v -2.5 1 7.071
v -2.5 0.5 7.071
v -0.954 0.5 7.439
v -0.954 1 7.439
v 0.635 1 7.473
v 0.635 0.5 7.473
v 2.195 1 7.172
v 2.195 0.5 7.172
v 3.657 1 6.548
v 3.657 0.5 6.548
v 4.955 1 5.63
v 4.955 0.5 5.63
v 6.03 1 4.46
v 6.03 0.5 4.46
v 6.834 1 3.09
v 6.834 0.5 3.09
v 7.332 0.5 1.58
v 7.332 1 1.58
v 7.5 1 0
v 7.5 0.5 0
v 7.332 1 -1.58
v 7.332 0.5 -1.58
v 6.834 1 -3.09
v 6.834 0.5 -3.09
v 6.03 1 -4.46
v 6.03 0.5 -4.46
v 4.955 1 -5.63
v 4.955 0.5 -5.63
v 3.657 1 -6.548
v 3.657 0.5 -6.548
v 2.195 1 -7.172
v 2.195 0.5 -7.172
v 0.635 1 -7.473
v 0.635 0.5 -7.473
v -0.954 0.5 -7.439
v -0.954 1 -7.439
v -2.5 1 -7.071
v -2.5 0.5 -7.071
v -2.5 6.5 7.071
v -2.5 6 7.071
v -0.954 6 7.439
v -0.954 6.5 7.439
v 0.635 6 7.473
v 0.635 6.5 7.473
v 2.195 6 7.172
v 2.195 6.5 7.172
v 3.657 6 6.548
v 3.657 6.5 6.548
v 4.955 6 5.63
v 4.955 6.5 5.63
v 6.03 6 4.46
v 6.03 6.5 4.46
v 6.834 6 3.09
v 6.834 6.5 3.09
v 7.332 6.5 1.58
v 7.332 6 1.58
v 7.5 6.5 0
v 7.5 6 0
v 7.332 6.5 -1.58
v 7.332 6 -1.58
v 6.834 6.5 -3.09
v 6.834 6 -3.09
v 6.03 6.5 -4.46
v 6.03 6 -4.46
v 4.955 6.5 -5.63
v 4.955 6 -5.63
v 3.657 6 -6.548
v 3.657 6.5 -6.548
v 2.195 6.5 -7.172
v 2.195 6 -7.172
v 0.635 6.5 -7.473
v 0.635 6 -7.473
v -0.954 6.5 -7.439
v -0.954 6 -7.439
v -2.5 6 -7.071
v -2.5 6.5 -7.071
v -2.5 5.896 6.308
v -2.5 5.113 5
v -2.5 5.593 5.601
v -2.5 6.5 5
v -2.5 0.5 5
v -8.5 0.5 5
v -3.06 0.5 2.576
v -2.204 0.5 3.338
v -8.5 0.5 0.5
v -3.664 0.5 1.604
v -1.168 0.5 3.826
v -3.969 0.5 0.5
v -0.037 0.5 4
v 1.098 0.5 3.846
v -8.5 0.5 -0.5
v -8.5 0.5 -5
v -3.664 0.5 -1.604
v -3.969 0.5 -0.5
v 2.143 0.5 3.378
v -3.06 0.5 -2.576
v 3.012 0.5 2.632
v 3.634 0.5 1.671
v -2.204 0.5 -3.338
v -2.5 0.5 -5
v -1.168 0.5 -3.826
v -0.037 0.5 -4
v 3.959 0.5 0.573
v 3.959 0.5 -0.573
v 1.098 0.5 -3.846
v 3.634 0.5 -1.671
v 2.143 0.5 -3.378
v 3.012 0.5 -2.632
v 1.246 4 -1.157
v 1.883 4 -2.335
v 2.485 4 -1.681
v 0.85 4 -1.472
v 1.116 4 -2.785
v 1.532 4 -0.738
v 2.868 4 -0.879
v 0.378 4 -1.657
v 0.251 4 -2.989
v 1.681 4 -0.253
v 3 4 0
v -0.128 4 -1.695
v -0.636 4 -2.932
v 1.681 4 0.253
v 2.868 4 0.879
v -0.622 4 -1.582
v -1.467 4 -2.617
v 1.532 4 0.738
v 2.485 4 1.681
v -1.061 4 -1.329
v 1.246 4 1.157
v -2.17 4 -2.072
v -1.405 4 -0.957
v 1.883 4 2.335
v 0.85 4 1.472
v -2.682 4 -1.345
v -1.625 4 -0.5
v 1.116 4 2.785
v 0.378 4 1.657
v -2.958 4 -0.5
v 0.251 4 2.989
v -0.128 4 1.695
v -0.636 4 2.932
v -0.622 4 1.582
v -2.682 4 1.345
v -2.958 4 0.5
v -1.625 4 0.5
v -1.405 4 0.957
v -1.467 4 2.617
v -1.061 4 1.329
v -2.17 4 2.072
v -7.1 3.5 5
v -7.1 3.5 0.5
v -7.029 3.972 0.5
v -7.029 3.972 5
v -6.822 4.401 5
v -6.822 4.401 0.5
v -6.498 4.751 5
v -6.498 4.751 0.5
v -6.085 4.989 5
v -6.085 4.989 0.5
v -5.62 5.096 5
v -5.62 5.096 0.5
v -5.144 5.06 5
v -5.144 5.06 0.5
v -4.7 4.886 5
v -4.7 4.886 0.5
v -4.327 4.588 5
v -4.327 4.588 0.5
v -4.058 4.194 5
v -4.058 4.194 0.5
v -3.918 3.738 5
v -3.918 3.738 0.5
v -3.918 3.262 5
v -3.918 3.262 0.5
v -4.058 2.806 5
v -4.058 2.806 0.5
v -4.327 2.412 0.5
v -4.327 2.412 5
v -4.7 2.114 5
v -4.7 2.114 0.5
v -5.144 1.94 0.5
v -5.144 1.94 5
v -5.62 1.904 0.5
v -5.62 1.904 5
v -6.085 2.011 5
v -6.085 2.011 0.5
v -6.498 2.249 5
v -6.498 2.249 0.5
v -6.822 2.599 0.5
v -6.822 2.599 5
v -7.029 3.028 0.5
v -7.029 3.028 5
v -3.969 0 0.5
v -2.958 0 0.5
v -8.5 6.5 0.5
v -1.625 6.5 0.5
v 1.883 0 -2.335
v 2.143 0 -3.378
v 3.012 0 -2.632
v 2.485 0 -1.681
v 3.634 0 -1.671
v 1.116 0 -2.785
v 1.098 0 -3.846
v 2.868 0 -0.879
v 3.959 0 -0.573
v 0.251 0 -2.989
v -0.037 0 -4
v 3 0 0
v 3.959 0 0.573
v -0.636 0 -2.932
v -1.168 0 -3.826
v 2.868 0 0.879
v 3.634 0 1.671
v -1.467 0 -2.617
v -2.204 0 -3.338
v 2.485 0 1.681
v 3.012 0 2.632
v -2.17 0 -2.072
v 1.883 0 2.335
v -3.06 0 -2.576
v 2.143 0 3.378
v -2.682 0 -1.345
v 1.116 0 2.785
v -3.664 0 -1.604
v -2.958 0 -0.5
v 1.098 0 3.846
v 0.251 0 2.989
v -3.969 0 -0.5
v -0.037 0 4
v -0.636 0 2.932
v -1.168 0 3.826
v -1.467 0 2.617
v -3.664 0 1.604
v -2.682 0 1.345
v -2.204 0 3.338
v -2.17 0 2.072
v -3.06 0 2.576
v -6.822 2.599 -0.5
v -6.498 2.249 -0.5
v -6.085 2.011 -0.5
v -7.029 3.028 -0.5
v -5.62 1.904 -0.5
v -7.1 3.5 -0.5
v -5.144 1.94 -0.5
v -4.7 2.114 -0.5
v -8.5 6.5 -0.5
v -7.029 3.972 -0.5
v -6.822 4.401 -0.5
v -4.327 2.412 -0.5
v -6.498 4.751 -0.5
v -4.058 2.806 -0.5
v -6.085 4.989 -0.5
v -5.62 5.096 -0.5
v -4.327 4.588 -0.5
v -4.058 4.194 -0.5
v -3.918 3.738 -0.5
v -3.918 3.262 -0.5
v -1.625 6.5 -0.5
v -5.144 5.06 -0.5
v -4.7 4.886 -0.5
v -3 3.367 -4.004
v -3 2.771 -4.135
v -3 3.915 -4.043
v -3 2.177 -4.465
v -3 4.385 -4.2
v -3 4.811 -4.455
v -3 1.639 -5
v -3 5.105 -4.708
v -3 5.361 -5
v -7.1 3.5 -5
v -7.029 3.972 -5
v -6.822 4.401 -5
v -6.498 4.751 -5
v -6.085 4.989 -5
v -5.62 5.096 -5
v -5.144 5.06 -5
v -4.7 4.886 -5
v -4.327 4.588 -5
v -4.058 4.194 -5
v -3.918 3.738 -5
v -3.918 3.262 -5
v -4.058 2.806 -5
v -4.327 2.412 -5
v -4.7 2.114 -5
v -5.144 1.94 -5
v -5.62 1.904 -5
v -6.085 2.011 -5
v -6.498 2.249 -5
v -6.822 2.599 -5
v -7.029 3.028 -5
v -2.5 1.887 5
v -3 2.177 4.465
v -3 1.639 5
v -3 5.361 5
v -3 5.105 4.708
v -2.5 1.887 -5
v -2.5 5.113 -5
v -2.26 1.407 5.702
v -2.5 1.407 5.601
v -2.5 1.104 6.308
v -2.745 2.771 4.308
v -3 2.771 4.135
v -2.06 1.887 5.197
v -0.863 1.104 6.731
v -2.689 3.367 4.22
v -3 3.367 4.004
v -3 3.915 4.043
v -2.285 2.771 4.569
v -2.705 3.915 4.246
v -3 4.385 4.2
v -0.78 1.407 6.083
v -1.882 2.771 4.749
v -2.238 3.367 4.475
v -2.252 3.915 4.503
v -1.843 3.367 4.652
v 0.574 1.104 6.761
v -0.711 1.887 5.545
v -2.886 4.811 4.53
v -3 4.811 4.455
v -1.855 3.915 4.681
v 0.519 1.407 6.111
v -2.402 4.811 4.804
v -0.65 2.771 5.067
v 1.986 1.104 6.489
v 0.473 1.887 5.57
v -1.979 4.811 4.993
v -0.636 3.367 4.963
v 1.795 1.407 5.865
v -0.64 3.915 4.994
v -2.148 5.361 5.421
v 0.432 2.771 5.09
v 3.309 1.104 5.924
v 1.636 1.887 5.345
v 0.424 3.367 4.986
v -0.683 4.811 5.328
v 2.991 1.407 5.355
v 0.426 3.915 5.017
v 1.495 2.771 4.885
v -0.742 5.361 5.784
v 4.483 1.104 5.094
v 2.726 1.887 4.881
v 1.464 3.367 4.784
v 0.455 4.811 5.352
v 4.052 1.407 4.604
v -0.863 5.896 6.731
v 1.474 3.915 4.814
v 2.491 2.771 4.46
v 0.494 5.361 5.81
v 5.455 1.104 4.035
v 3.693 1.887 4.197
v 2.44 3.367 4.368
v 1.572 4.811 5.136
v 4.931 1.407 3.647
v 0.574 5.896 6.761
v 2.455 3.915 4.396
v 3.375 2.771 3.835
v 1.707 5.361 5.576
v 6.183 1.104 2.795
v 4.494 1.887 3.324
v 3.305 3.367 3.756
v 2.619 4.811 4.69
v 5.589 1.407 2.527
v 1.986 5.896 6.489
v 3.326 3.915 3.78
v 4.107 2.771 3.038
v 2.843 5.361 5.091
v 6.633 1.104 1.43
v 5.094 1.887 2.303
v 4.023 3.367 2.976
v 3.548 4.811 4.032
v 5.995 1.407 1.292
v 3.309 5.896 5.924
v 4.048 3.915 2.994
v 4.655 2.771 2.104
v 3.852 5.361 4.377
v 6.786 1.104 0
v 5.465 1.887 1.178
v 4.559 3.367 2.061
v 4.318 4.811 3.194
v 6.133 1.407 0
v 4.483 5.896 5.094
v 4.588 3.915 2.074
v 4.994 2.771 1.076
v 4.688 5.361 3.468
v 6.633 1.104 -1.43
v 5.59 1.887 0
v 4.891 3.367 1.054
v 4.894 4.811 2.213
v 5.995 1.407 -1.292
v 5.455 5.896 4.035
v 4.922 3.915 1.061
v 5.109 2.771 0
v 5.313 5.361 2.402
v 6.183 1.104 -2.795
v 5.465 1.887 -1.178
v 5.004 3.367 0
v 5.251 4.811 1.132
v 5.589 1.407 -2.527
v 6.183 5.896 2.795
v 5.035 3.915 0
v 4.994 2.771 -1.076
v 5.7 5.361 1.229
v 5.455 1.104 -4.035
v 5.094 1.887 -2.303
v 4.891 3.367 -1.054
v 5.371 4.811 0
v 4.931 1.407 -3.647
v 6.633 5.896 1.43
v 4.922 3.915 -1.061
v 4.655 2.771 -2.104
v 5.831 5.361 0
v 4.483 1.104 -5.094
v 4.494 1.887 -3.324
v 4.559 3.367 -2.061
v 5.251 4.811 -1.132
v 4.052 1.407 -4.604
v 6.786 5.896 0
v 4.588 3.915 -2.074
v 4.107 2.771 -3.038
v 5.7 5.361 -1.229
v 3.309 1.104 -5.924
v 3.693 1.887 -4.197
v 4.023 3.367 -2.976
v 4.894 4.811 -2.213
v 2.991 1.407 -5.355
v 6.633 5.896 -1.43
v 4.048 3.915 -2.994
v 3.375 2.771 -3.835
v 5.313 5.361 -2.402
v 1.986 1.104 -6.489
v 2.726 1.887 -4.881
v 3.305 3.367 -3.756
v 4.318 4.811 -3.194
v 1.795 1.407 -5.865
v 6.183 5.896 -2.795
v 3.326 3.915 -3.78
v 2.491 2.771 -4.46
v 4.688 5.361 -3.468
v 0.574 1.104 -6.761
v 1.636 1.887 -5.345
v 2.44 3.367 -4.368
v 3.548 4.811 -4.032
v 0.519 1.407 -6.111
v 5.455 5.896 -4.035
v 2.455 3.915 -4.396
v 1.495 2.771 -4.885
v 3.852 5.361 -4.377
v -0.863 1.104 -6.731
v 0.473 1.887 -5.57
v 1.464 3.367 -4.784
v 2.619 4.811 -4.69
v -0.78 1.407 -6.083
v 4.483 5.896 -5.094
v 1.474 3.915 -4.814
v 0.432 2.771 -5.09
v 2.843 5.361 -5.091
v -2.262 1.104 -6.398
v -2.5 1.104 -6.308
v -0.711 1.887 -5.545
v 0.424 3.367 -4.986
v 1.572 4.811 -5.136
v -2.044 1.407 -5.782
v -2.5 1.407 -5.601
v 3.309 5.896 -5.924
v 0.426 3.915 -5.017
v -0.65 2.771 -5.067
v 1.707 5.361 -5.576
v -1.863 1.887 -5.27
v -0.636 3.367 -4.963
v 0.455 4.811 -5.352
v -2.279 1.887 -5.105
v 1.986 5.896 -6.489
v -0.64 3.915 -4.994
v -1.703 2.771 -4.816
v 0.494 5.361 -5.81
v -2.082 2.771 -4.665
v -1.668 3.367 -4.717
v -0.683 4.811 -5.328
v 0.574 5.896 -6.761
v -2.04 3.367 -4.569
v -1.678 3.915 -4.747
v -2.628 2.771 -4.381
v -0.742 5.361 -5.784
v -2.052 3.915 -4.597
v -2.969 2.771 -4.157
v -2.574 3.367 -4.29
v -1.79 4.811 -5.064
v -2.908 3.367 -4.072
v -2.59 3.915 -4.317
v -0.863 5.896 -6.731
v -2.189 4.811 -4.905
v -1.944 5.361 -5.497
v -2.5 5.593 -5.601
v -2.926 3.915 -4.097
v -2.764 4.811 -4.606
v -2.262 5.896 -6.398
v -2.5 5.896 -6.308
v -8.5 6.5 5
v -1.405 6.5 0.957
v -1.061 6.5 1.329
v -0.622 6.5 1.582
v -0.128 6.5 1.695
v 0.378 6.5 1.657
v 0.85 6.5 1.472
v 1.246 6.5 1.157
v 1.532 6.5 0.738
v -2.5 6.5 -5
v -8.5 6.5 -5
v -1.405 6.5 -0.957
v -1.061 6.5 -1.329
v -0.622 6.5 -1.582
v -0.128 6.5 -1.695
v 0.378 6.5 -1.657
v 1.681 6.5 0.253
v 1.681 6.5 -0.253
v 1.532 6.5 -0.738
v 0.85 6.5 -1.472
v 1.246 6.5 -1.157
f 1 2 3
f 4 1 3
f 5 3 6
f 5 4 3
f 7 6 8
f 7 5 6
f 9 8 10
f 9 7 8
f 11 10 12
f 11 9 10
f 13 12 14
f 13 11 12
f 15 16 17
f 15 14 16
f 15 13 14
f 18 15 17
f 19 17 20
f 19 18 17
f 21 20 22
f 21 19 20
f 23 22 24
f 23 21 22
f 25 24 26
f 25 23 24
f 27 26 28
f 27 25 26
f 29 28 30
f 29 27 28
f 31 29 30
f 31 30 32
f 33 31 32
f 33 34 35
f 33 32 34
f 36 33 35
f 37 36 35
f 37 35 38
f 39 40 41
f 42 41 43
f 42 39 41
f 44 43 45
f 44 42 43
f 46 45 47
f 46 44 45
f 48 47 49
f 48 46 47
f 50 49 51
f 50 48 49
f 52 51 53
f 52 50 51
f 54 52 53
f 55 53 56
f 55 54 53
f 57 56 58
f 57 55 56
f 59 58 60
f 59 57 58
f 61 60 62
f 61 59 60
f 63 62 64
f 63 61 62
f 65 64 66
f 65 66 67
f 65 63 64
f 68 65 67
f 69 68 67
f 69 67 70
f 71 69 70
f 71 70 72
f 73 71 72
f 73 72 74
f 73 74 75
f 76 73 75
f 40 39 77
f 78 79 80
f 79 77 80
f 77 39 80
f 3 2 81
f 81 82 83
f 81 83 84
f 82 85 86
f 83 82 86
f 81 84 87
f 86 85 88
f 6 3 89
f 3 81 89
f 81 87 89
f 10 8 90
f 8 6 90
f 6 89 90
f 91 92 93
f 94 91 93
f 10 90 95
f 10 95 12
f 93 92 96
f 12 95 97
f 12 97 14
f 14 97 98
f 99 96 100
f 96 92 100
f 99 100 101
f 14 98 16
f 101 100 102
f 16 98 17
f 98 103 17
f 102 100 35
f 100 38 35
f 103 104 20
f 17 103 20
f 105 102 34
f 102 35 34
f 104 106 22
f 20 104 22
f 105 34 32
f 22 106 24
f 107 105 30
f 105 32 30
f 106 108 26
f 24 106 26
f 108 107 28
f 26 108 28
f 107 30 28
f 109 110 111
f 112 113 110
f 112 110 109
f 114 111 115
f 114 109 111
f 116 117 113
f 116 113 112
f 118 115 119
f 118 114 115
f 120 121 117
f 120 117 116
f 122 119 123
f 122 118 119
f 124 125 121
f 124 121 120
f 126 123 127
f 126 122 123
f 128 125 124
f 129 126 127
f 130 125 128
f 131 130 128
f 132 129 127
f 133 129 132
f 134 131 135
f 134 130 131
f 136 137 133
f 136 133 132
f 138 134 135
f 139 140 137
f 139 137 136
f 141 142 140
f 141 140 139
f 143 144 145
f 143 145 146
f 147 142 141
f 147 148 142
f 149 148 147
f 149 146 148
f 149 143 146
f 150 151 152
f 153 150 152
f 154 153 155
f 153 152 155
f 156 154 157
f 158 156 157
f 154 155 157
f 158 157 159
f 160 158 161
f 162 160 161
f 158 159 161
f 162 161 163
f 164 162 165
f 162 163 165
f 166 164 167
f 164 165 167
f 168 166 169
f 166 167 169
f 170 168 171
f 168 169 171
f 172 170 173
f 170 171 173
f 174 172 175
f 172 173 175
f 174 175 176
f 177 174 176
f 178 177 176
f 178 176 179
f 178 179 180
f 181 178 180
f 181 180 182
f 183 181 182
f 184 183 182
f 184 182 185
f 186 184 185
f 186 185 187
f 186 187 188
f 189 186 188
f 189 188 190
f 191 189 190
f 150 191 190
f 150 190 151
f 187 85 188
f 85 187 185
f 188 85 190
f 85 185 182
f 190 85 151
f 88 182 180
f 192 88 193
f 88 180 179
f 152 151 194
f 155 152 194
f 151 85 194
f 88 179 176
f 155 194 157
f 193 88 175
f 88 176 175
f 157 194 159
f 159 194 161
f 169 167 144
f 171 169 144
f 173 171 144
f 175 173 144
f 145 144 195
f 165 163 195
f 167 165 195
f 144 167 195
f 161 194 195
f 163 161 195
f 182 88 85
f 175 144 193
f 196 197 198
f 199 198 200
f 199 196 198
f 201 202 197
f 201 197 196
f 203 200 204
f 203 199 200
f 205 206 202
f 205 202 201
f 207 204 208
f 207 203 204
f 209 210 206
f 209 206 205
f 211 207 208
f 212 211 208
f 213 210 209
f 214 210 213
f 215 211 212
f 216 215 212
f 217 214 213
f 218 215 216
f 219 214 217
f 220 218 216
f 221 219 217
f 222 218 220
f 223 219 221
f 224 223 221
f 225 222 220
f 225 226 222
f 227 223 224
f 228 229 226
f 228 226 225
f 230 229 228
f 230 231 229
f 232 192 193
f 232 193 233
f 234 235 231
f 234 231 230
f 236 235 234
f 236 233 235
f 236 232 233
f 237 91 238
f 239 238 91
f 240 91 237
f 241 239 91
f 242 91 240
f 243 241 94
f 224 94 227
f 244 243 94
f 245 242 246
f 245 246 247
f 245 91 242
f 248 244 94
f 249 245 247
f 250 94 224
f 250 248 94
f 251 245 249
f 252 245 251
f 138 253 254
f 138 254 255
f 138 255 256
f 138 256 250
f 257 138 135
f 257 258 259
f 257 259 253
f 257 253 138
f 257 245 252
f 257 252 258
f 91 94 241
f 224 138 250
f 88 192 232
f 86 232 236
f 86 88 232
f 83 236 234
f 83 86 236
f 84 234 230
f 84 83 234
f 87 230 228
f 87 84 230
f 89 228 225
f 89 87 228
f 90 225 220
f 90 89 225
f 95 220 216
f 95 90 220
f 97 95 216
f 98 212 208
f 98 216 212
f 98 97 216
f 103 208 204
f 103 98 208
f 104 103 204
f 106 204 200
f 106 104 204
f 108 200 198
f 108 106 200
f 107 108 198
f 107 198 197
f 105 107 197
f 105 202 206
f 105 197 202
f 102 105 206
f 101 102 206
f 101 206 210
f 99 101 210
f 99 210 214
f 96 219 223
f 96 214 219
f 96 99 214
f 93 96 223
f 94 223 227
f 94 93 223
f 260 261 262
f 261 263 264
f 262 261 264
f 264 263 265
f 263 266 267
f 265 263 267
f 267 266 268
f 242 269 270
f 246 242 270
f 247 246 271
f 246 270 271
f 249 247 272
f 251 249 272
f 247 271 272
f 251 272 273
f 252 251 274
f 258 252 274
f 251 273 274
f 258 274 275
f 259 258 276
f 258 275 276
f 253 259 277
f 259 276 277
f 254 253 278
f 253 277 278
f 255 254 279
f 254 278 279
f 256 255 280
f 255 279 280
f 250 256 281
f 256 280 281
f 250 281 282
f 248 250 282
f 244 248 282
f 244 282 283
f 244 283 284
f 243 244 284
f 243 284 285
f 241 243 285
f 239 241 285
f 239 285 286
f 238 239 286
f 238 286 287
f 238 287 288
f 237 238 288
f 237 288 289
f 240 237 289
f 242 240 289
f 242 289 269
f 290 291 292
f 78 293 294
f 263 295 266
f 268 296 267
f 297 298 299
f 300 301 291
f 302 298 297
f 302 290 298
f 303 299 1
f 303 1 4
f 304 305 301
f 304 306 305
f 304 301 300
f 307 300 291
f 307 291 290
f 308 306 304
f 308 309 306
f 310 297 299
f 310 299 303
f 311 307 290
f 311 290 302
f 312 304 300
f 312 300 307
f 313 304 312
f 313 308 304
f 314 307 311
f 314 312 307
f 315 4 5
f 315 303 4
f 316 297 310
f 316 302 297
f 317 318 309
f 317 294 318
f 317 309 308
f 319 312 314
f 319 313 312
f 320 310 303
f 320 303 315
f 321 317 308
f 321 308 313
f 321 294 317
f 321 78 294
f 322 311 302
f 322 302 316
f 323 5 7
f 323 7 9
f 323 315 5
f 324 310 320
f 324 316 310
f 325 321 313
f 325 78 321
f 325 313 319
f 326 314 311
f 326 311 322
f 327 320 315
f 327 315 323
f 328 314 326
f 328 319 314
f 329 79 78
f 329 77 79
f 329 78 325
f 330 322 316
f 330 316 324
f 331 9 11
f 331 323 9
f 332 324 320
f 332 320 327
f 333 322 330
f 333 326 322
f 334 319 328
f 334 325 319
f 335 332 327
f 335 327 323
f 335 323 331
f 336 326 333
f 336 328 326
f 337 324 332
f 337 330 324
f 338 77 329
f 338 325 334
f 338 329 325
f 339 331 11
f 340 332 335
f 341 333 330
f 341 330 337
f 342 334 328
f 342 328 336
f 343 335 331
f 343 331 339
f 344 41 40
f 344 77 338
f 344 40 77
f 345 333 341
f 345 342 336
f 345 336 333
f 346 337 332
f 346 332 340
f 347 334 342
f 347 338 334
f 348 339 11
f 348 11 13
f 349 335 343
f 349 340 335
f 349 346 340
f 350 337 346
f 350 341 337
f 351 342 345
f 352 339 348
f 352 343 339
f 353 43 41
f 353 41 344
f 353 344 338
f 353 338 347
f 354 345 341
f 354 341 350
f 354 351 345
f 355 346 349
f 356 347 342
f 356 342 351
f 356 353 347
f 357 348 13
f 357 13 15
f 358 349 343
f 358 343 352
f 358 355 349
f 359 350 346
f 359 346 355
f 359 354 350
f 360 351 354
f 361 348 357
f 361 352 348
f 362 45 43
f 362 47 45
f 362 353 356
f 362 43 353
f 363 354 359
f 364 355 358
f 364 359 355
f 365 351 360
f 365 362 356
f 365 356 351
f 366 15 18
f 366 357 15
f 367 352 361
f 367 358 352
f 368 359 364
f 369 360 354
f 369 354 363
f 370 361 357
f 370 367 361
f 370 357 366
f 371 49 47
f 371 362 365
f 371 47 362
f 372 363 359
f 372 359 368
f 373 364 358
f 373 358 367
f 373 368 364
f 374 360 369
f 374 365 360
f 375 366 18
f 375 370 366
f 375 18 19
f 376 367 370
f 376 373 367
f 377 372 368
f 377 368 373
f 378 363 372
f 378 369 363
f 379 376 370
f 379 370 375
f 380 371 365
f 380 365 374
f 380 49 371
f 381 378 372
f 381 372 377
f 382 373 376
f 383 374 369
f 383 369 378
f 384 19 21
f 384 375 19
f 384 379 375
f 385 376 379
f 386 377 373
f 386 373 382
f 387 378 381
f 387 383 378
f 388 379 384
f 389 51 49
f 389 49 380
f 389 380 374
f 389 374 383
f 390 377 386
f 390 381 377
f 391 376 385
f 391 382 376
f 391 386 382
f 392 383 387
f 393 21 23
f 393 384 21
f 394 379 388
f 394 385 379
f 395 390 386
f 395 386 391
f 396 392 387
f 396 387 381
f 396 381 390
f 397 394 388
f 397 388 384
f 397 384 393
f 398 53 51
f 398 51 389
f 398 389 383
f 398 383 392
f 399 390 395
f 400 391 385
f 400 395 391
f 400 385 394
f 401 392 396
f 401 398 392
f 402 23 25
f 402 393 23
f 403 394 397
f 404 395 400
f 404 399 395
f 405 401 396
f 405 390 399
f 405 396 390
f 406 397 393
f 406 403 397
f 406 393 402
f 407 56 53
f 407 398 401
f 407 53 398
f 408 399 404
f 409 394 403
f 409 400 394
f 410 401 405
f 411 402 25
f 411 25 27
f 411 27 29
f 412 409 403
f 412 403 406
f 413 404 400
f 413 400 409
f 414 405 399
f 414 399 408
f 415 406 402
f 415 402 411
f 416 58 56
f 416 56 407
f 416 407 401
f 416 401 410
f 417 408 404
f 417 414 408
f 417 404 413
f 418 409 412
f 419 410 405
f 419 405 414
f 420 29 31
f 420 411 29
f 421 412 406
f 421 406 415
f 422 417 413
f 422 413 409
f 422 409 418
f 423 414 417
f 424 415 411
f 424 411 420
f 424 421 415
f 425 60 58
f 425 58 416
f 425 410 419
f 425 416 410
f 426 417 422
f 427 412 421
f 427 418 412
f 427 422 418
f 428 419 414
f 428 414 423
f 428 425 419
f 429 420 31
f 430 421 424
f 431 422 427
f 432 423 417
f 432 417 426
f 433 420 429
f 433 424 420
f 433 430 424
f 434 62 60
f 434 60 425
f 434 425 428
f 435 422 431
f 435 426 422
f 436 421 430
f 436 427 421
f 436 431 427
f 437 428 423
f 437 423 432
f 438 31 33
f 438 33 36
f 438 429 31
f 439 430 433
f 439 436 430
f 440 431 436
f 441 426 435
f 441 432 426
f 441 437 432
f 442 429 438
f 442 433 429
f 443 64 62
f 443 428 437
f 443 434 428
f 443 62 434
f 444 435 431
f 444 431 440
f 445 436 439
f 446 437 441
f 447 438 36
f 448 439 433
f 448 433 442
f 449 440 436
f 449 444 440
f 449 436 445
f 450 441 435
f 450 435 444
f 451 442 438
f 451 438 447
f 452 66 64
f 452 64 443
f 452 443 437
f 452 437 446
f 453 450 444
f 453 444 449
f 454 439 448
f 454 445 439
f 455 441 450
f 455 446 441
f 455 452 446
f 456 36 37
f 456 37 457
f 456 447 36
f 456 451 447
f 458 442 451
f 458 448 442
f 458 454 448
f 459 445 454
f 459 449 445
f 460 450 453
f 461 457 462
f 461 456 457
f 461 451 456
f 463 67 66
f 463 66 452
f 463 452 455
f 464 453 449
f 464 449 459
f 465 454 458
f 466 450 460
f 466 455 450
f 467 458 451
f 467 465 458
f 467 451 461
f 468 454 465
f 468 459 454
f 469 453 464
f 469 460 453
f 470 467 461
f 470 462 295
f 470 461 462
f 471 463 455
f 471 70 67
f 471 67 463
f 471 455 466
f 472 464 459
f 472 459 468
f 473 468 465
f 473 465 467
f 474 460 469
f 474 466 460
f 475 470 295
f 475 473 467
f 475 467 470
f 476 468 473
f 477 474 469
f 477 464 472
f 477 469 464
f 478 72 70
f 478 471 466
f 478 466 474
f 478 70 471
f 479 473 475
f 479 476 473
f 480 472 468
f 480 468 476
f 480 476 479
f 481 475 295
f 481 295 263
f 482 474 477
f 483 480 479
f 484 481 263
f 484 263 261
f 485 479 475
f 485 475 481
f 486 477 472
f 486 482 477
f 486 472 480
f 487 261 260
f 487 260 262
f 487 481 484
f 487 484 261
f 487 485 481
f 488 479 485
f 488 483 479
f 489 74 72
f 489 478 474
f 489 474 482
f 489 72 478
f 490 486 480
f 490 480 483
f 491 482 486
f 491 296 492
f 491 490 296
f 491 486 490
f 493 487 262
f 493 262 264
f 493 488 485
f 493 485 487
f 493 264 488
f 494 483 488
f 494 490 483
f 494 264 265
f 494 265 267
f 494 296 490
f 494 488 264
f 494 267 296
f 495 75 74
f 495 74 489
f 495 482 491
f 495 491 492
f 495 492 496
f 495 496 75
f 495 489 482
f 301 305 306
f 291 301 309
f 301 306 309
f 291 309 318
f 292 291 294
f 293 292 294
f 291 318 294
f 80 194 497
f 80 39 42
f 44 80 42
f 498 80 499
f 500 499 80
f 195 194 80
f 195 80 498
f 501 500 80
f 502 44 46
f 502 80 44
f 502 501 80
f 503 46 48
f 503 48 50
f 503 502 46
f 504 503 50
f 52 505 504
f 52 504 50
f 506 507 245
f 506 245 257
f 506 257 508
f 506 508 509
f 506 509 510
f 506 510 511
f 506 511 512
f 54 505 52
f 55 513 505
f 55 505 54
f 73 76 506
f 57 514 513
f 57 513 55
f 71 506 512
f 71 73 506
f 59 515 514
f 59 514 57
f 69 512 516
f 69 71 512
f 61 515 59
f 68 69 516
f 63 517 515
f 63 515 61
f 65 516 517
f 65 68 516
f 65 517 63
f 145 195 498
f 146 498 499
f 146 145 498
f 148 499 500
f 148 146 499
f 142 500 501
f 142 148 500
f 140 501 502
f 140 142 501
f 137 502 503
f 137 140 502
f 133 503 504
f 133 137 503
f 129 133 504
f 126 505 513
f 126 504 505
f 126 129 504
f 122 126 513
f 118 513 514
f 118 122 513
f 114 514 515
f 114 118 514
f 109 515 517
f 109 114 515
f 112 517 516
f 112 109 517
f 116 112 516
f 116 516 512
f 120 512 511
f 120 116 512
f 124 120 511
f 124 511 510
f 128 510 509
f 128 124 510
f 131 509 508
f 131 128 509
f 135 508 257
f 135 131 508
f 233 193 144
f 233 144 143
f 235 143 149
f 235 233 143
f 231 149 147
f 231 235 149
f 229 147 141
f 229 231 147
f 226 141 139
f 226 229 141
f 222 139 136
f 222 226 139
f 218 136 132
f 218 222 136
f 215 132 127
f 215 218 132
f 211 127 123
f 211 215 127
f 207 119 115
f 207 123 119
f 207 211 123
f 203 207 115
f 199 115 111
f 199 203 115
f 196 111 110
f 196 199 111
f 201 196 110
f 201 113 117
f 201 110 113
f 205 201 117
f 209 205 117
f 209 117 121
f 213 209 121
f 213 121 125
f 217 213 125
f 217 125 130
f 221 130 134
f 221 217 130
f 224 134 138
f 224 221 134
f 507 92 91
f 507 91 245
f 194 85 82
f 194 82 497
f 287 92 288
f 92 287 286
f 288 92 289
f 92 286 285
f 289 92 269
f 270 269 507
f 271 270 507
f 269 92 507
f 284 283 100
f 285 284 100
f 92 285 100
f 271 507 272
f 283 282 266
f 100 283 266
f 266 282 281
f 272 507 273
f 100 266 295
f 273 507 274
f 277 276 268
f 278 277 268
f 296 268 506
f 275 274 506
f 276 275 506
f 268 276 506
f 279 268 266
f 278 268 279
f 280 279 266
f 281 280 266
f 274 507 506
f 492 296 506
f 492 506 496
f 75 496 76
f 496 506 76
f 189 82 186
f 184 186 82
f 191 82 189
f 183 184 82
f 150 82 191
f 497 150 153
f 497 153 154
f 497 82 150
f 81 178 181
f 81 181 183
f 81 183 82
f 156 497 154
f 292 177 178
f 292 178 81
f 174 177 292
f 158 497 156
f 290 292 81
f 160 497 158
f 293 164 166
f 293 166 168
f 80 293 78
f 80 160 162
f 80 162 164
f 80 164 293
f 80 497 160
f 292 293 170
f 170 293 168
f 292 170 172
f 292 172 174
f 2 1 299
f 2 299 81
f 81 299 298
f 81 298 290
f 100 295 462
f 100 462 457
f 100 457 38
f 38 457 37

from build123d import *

# Parameters (mm, degrees)
CLAMP_EXTRUSION_DEPTH      = 5
CLAMP_EXTRUSION_DEPTH_BACK = 5
SKETCH2_W                  = 5.5
SKETCH2_H                  = 6
SKETCH3_W                  = 6
SKETCH3_H                  = 2.071067812
SKETCH3_W_2                = 8.5
SKETCH3_H_2                = 1
CLAMP_CUTOUT_DEPTH         = 14.067134468
CLAMP_HOLE_D               = 3.2


with BuildPart() as part:
    # Sketch1 → body (revolve)
    with BuildSketch(Plane.XY):
        with BuildLine():
            Line((3, 0), (4, 0))
            Line((4, 0), (4, 0.5))
            Line((4, 0.5), (7.5, 0.5))
            Line((7.5, 0.5), (7.5, 1))
            ThreePointArc((7.5, 1), (5, 3.5), (7.5, 6))
            Line((7.5, 6), (7.5, 6.5))
            Line((7.5, 6.5), (1.7, 6.5))
            Line((1.7, 6.5), (1.7, 4))
            Line((1.7, 4), (3, 4))
            Line((3, 4), (3, 0))
        make_face()
    revolve(axis=Axis((0, 0, 0), (0, 1, 0)))

    # Sketch2 → clamp_extrusion (add, two sides: drawn at the far end of the back side and taken through both)
    with BuildSketch(Plane.XY.offset(-CLAMP_EXTRUSION_DEPTH_BACK)):
        with Locations((-5.75, 3.5)):
            Rectangle(SKETCH2_W, SKETCH2_H)
    extrude(amount=CLAMP_EXTRUSION_DEPTH + CLAMP_EXTRUSION_DEPTH_BACK)

    # Sketch3 → clamp_cutout (cut, through all)
    with BuildSketch(Plane(origin=(0, 6.5, 0), x_dir=(1, 0, 0), z_dir=(0, 1, 0))):
        with Locations((-5.5, 6.035533906)):
            Rectangle(SKETCH3_W, SKETCH3_H)
        with Locations((-5.5, -6.035533906)):
            Rectangle(SKETCH3_W, SKETCH3_H)
        with Locations((-4.25, 0)):
            Rectangle(SKETCH3_W_2, SKETCH3_H_2)
    extrude(amount=-CLAMP_CUTOUT_DEPTH, mode=Mode.SUBTRACT)

    # clamp_hole (through all)
    with Locations(Plane.XY.offset(5)):
        with Locations((-5.5, 3.5)):
            Hole(CLAMP_HOLE_D / 2)


solid = part.part
